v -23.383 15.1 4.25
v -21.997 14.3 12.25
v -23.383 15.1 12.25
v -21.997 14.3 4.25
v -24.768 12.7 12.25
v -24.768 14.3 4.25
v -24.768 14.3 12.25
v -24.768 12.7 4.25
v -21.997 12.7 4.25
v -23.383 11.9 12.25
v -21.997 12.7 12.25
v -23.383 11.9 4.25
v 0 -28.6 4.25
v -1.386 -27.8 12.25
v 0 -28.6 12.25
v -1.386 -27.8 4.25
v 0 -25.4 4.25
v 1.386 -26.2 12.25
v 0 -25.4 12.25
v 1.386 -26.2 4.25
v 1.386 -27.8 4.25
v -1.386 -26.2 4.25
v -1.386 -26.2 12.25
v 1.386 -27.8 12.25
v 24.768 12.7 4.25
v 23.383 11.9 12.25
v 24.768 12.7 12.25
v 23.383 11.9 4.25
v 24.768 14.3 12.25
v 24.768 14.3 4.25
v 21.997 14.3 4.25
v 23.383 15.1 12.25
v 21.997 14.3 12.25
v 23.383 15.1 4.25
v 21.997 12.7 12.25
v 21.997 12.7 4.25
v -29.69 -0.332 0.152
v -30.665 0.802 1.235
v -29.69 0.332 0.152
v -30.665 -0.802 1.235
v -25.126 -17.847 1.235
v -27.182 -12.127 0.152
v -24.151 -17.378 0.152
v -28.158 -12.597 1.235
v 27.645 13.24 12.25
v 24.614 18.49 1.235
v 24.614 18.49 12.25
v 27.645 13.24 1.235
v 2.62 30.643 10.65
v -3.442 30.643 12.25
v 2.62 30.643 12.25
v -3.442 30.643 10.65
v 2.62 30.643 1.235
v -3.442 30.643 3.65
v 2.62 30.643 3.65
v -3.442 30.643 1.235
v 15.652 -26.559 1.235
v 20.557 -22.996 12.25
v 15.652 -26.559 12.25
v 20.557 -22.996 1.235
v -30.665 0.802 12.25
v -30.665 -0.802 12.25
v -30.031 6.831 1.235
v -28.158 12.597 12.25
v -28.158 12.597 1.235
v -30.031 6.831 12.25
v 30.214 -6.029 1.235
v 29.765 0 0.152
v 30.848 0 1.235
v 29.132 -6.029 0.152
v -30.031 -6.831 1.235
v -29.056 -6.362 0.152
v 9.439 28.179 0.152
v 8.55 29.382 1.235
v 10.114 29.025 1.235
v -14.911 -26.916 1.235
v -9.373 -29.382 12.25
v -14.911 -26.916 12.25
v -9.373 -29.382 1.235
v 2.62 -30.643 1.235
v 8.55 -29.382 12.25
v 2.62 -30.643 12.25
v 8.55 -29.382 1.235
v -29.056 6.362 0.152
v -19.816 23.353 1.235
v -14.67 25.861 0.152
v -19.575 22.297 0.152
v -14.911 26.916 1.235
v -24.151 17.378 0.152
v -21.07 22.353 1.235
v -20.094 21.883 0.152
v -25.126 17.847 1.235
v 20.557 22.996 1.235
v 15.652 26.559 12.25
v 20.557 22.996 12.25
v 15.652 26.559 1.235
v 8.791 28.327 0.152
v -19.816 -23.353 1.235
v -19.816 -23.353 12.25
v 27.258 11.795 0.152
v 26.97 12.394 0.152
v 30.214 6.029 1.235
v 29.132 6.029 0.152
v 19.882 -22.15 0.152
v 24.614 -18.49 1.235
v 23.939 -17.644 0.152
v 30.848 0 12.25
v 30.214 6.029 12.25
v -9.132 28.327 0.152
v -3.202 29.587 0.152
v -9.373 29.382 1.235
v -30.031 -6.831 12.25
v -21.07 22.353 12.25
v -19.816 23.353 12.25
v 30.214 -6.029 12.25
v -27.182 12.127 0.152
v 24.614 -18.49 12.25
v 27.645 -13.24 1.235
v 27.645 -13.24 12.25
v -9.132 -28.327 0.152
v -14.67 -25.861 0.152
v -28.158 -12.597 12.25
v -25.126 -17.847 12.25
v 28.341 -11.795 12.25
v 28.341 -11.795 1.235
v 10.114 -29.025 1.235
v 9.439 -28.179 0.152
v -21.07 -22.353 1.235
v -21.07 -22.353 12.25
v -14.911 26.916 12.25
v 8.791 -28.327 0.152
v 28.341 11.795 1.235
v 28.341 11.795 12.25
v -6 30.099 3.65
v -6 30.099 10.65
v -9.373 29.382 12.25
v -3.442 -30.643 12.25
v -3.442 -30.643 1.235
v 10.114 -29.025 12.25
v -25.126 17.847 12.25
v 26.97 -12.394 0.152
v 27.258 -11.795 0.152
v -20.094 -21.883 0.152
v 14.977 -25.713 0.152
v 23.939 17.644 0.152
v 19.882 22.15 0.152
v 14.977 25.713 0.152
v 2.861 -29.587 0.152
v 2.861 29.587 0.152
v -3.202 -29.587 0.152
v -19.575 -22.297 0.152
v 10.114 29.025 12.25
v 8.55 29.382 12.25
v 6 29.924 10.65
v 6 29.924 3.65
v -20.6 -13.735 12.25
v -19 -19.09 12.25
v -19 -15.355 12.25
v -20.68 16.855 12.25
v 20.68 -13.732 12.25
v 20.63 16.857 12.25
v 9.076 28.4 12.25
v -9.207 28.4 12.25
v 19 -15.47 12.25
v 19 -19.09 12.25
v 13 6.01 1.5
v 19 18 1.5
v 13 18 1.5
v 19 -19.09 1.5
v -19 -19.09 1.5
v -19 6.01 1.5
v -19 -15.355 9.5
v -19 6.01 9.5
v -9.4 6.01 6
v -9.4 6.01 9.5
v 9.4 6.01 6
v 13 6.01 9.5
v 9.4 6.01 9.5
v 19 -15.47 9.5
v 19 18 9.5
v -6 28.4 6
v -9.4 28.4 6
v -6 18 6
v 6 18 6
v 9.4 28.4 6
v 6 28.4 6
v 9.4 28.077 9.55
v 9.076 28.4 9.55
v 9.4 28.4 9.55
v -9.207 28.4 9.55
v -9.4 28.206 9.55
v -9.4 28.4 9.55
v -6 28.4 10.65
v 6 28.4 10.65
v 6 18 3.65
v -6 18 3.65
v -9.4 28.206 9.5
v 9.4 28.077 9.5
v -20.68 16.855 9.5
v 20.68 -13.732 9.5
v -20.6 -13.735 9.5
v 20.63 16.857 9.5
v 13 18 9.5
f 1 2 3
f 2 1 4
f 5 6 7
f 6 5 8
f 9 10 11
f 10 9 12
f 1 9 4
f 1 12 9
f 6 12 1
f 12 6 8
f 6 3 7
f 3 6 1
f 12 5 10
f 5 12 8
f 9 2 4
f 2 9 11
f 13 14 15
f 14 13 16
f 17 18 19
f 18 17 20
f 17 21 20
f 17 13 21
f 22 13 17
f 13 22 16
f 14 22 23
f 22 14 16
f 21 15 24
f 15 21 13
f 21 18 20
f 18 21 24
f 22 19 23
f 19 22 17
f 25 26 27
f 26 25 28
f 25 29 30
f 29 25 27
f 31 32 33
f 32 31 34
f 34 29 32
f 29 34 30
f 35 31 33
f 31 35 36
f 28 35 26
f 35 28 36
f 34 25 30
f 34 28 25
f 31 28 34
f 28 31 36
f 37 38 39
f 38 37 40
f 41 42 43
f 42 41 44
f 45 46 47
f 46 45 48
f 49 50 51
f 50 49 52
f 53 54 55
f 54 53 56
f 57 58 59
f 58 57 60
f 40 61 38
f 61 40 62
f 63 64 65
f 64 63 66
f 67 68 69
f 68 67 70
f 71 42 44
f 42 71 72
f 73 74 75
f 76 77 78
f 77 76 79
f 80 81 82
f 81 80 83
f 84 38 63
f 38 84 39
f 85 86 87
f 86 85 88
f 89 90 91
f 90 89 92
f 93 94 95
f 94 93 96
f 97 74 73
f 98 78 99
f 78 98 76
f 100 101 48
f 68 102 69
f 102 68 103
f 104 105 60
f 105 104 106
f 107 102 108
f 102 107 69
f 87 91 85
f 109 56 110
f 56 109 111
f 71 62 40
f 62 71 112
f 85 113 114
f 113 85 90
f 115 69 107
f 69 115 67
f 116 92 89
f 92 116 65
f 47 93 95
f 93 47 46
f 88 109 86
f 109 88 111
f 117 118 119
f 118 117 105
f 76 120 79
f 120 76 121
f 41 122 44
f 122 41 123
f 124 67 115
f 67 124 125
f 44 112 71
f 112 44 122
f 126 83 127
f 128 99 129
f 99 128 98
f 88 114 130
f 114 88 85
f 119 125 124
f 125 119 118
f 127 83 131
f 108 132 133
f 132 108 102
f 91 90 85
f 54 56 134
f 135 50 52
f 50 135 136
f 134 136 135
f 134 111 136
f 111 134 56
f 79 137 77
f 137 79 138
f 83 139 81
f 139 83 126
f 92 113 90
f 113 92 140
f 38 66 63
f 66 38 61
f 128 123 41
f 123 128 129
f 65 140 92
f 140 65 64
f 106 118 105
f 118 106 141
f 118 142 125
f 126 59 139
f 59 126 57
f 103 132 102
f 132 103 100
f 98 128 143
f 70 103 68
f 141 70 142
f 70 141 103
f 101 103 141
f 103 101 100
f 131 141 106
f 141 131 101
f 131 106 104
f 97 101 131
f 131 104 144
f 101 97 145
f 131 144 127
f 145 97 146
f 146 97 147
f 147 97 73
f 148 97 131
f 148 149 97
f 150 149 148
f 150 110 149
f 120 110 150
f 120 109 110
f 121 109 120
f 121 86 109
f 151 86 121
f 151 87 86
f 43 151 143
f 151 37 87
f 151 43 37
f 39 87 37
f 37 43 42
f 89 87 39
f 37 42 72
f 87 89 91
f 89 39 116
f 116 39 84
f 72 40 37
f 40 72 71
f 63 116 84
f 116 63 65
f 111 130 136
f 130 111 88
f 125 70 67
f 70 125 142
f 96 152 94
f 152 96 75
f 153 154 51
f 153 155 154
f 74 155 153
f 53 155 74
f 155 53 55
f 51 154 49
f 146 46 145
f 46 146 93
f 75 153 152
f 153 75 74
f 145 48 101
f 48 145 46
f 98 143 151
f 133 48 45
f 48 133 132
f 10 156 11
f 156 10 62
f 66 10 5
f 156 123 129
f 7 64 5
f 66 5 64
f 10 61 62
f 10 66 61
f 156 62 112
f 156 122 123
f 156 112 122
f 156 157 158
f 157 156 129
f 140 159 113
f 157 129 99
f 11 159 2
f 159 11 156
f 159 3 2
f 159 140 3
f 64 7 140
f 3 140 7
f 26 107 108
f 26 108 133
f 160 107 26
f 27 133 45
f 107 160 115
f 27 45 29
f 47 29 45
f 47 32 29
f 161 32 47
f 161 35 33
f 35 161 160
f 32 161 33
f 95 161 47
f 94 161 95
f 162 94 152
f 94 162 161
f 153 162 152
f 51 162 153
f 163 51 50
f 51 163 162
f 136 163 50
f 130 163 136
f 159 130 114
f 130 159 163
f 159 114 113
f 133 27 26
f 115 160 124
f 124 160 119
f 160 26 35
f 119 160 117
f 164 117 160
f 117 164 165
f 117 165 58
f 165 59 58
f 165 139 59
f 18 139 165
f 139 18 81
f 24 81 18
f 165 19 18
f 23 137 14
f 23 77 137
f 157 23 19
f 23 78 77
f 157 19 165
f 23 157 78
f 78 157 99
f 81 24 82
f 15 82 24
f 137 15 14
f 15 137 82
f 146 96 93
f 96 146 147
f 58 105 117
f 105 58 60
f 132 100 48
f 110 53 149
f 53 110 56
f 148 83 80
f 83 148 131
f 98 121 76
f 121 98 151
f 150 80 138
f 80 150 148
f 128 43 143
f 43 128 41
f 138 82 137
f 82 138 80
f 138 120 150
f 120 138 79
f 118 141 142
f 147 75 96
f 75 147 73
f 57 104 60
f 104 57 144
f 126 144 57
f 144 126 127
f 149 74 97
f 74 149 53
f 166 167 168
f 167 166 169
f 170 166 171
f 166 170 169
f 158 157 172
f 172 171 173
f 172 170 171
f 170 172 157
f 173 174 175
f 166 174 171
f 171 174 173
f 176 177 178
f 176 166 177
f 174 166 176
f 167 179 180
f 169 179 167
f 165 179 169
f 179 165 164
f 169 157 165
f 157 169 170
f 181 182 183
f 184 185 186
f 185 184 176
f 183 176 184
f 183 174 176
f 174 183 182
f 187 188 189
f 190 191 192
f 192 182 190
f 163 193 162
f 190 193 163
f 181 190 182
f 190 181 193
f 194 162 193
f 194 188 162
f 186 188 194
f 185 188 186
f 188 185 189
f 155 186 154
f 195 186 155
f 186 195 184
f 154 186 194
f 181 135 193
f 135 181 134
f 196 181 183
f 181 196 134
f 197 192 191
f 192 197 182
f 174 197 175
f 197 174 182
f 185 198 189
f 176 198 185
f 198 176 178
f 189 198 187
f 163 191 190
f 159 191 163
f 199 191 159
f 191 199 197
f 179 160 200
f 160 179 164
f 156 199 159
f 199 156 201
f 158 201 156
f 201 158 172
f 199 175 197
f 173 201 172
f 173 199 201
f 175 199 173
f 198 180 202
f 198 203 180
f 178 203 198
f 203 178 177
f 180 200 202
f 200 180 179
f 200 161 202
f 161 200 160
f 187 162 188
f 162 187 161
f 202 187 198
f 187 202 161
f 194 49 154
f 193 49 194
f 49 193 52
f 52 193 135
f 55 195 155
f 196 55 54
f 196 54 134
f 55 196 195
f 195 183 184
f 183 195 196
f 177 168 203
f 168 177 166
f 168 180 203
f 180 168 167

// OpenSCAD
// file: common.scad
// Easy Button style case for the rev1 single-button board. All white.
//
// Three printable parts: base, button, clamp.
// Origin is the PCB center. +Y is USB. +Z is the button face.
// z = 0 is the outside of the base floor.
//
// OBJ mesh units are 0.254 mm. The PCB is about 40.5 x 43.9 mm and its
// corners sit at r ≈ 28.3 mm. The switch is dead center. The XIAO is on
// the back at the USB end (about y = 2 to 23).
//
// The cell's long side runs along X, same direction as the PCB width.
// outer_r is 32. The board, module, and battery are shifted toward USB
// only as far as that circle allows. The USB cut is a tunnel out through
// the wall.

// Body
outer_r = 31;
// Board and module, toward USB from the switch. The USB end needs wall left.
stack_y = 6;
floor_t = 1.5;
pcb_t = 1.6;
pcb_gap = 0.45;

// Battery
// 38 mm across the PCB width, 25 mm toward the tail of the board, plus wiggle.
battery_x = 38.0;
battery_y = 25.1;
battery_top = -0.01;    // Slight overlap to eliminate the wall between the battery and the module
battery_d = 8;     // under the PCB; 8 mm cell plus clearance

// XIAO
xiao_w = 18.8;
xiao_body_y0 = 0;
xiao_body_y1 = 22.4;
xiao_usb_w = 12.0;
xiao_usb_y1 = 23.3;
xiao_d = 3.5;

// Button
switch_h = 1.8;
tip_gap = 0.35;
tip_d = 4;
tip_straight = 1.6;
travel = 1.0;
flange_r = 26.0;
flange_t = 2.0;
face_r = 23.0;
face_h = 3.4;         // flat top, stands proud of the clamp lip
opening_r = 23.0;     // clamp hole the face passes through

// Clamp
lip_t = 1.8;
screw_r = 27;      // head stays inside outer_r, shaft stays outside the flange
screw_angles = [-210, 270, -330];
screw_clear_d = 3.3;
screw_pilot_d = 3.2;
screw_pilot_h = 8.0;
screw_head_d = 5.4;
screw_head_h = 1.5;

// USB
// Tunnel from the connector (inside the circle) out through the wall.
usb_w = 12.0;
usb_h = 7.0;
usb_drop = 2.35;
usb_y0 = 12;

eps = 0.05;

// --- derived ---
pcb_z = floor_t + battery_d;
pcb_top = pcb_z + pcb_t;
switch_top = pcb_top + switch_h;
tip_rest = switch_top + tip_gap;
seat_z = tip_rest - travel;
lip_z = flange_t + travel;                 // lip underside, relative to the clamp bottom
clamp_h = lip_z + lip_t;
flange_clear_r = flange_r + 0.55;

board_pts = [
  [-17.78, -21.95],
  [ 17.91, -21.95],
  [ 20.23, -19.55],
  [ 20.18,  10.67],
  [  8.89,  21.95],
  [ -9.02,  21.95],
  [-20.23,  10.67],
  [-20.15, -19.55]
];

module board_2d() {
  translate([0, stack_y])
    polygon(board_pts);
}

module battery_2d() {
  // +Y edge sits battery_top below the module.
  translate([0, stack_y - battery_top - battery_y / 2])
    square([battery_x, battery_y], center = true);
}

module xiao_2d() {
  translate([0, stack_y]) {
    translate([0, (xiao_body_y0 + xiao_body_y1) / 2])
      square([xiao_w, xiao_body_y1 - xiao_body_y0], center = true);
    translate([0, (xiao_body_y1 - 1.2 + xiao_usb_y1) / 2])
      square([xiao_usb_w, xiao_usb_y1 - (xiao_body_y1 - 1.2)], center = true);
  }
}

module base() {
  difference() {
    base_body();
    translate([0, 0, floor_t])
      linear_extrude(battery_d + eps + 10) //extrude all the way out
        battery_2d();
    translate([0, 0, pcb_z - xiao_d])
      linear_extrude(xiao_d + eps)
        xiao_2d();
    translate([0, 0, pcb_z])
      linear_extrude(seat_z - pcb_z + eps)
        offset(delta = pcb_gap) board_2d();
    usb_tunnel();
    wire_notch();
    screw_pilots();
  }
  // pcb_tabs();
}

// Press the board past these. They keep it from falling out when the cap is off.
module pcb_tabs() {
  z0 = pcb_top + 0.35;
  h = 1.3;
  translate([-21.2, stack_y - 5, z0]) cube([1.8, 10, h]);
  translate([19.4, stack_y - 5, z0]) cube([1.8, 10, h]);
  // translate([-6, stack_y - 22.9, z0]) cube([12, 1.8, h]); //3rd tab, lets just exclude for now, maybe later?
}

module usb_tunnel() {
  cz = pcb_z - usb_drop;
  translate([-usb_w / 2, usb_y0 + stack_y, cz - usb_h / 2])
    cube([usb_w, outer_r - (usb_y0 + stack_y) + 2, usb_h]);
}

module wire_notch() {
  translate([13, stack_y - 3, pcb_z - 8])
    cube([6, 15, 8 + eps]);
}

module screw_pilots() {
  for (a = screw_angles)
    rotate([0, 0, a])
      translate([screw_r, 0, seat_z - screw_pilot_h])
        cylinder(d = screw_pilot_d, h = screw_pilot_h + eps);
}

// Outer wall. The bottom edge is a quarter-round of radius rad.
module base_body() {
  rad = 2;
  minkowski() {
    translate([0, 0, rad])
      cylinder(r = outer_r - rad, h = seat_z - rad);
    difference() {
      sphere(r = rad);
      translate([-rad * 2, -rad * 2, 0])
        cube([rad * 4, rad * 4, rad * 2]);
    }
  }
}

module clamp() {
  difference() {
    cylinder(r = outer_r, h = clamp_h);
    // Below the lip the flange has to move.
    translate([0, 0, -eps])
      cylinder(r = flange_clear_r, h = lip_z + eps);
    // Opening the face comes through.
    translate([0, 0, lip_z - eps])
      cylinder(r = opening_r, h = lip_t + 2 * eps);
    screw_clearance();
  }
}

module screw_clearance() {
  for (a = screw_angles)
    rotate([0, 0, a])
      translate([screw_r, 0, 0]) {
        translate([0, 0, -eps])
          cylinder(d = screw_clear_d, h = clamp_h + 2 * eps);
        // Head sits on the top face, the same face as the lip.
        translate([0, 0, clamp_h - screw_head_h])
          cylinder(d = screw_head_d, h = screw_head_h + eps);
      }
}

module button() {
  rad = 0.5;

  minkowski() {
    union() {
      translate([0, 0, tip_rest])
        cylinder(r = flange_r - (rad * 2), h = flange_t - (rad * 2));
      translate([0, 0, tip_rest + flange_t - eps])
        cylinder(r = face_r - (rad * 2), h = face_h - (rad * 2));
      translate([0, 0, tip_rest])
        cylinder(d = tip_d - 2*rad, h = tip_straight - rad + eps);
      translate([0, 0, tip_rest + tip_straight])
        cylinder(d = - 2*rad, h = tip_rest - tip_rest - tip_straight - rad + eps);
    }
    sphere(r = rad);
  }
}

module button_solid() {
  difference() {
    button();
    // led_dots();
  }
}

module led_dots() {
  for (p = [[0, -6.2], [-2.3, -5.4], [2.3, -5.4], [-4.2, -4.0], [4.2, -4.0]])
    translate([p[0], p[1], tip_rest + flange_t + 1.2])
      cylinder(d = 1.5, h = face_h);
}

module pcb_ghost() {
  translate([0, 0, pcb_z])
    linear_extrude(pcb_t)
      board_2d();
}

module battery_ghost() {
  translate([0, 0, floor_t + 0.4])
    linear_extrude(battery_d - 2.2)
      offset(delta = -0.7) battery_2d();
}

module xiao_ghost() {
  translate([0, 0, pcb_z - xiao_d + 0.35])
    linear_extrude(xiao_d - 0.7)
      offset(delta = -0.4) xiao_2d();
}

echo(str("seat ", seat_z, "  clamp ", seat_z, " to ", seat_z + clamp_h));
echo(str("battery ", battery_x, " x ", battery_y, "  top y ", battery_top));
echo(str("outer d ", outer_r * 2, "  face d ", face_r * 2));
// main file
// Circular base. Print floor-down. No supports.
//   openscad -o base.stl base.scad
include <common.scad>

base();
